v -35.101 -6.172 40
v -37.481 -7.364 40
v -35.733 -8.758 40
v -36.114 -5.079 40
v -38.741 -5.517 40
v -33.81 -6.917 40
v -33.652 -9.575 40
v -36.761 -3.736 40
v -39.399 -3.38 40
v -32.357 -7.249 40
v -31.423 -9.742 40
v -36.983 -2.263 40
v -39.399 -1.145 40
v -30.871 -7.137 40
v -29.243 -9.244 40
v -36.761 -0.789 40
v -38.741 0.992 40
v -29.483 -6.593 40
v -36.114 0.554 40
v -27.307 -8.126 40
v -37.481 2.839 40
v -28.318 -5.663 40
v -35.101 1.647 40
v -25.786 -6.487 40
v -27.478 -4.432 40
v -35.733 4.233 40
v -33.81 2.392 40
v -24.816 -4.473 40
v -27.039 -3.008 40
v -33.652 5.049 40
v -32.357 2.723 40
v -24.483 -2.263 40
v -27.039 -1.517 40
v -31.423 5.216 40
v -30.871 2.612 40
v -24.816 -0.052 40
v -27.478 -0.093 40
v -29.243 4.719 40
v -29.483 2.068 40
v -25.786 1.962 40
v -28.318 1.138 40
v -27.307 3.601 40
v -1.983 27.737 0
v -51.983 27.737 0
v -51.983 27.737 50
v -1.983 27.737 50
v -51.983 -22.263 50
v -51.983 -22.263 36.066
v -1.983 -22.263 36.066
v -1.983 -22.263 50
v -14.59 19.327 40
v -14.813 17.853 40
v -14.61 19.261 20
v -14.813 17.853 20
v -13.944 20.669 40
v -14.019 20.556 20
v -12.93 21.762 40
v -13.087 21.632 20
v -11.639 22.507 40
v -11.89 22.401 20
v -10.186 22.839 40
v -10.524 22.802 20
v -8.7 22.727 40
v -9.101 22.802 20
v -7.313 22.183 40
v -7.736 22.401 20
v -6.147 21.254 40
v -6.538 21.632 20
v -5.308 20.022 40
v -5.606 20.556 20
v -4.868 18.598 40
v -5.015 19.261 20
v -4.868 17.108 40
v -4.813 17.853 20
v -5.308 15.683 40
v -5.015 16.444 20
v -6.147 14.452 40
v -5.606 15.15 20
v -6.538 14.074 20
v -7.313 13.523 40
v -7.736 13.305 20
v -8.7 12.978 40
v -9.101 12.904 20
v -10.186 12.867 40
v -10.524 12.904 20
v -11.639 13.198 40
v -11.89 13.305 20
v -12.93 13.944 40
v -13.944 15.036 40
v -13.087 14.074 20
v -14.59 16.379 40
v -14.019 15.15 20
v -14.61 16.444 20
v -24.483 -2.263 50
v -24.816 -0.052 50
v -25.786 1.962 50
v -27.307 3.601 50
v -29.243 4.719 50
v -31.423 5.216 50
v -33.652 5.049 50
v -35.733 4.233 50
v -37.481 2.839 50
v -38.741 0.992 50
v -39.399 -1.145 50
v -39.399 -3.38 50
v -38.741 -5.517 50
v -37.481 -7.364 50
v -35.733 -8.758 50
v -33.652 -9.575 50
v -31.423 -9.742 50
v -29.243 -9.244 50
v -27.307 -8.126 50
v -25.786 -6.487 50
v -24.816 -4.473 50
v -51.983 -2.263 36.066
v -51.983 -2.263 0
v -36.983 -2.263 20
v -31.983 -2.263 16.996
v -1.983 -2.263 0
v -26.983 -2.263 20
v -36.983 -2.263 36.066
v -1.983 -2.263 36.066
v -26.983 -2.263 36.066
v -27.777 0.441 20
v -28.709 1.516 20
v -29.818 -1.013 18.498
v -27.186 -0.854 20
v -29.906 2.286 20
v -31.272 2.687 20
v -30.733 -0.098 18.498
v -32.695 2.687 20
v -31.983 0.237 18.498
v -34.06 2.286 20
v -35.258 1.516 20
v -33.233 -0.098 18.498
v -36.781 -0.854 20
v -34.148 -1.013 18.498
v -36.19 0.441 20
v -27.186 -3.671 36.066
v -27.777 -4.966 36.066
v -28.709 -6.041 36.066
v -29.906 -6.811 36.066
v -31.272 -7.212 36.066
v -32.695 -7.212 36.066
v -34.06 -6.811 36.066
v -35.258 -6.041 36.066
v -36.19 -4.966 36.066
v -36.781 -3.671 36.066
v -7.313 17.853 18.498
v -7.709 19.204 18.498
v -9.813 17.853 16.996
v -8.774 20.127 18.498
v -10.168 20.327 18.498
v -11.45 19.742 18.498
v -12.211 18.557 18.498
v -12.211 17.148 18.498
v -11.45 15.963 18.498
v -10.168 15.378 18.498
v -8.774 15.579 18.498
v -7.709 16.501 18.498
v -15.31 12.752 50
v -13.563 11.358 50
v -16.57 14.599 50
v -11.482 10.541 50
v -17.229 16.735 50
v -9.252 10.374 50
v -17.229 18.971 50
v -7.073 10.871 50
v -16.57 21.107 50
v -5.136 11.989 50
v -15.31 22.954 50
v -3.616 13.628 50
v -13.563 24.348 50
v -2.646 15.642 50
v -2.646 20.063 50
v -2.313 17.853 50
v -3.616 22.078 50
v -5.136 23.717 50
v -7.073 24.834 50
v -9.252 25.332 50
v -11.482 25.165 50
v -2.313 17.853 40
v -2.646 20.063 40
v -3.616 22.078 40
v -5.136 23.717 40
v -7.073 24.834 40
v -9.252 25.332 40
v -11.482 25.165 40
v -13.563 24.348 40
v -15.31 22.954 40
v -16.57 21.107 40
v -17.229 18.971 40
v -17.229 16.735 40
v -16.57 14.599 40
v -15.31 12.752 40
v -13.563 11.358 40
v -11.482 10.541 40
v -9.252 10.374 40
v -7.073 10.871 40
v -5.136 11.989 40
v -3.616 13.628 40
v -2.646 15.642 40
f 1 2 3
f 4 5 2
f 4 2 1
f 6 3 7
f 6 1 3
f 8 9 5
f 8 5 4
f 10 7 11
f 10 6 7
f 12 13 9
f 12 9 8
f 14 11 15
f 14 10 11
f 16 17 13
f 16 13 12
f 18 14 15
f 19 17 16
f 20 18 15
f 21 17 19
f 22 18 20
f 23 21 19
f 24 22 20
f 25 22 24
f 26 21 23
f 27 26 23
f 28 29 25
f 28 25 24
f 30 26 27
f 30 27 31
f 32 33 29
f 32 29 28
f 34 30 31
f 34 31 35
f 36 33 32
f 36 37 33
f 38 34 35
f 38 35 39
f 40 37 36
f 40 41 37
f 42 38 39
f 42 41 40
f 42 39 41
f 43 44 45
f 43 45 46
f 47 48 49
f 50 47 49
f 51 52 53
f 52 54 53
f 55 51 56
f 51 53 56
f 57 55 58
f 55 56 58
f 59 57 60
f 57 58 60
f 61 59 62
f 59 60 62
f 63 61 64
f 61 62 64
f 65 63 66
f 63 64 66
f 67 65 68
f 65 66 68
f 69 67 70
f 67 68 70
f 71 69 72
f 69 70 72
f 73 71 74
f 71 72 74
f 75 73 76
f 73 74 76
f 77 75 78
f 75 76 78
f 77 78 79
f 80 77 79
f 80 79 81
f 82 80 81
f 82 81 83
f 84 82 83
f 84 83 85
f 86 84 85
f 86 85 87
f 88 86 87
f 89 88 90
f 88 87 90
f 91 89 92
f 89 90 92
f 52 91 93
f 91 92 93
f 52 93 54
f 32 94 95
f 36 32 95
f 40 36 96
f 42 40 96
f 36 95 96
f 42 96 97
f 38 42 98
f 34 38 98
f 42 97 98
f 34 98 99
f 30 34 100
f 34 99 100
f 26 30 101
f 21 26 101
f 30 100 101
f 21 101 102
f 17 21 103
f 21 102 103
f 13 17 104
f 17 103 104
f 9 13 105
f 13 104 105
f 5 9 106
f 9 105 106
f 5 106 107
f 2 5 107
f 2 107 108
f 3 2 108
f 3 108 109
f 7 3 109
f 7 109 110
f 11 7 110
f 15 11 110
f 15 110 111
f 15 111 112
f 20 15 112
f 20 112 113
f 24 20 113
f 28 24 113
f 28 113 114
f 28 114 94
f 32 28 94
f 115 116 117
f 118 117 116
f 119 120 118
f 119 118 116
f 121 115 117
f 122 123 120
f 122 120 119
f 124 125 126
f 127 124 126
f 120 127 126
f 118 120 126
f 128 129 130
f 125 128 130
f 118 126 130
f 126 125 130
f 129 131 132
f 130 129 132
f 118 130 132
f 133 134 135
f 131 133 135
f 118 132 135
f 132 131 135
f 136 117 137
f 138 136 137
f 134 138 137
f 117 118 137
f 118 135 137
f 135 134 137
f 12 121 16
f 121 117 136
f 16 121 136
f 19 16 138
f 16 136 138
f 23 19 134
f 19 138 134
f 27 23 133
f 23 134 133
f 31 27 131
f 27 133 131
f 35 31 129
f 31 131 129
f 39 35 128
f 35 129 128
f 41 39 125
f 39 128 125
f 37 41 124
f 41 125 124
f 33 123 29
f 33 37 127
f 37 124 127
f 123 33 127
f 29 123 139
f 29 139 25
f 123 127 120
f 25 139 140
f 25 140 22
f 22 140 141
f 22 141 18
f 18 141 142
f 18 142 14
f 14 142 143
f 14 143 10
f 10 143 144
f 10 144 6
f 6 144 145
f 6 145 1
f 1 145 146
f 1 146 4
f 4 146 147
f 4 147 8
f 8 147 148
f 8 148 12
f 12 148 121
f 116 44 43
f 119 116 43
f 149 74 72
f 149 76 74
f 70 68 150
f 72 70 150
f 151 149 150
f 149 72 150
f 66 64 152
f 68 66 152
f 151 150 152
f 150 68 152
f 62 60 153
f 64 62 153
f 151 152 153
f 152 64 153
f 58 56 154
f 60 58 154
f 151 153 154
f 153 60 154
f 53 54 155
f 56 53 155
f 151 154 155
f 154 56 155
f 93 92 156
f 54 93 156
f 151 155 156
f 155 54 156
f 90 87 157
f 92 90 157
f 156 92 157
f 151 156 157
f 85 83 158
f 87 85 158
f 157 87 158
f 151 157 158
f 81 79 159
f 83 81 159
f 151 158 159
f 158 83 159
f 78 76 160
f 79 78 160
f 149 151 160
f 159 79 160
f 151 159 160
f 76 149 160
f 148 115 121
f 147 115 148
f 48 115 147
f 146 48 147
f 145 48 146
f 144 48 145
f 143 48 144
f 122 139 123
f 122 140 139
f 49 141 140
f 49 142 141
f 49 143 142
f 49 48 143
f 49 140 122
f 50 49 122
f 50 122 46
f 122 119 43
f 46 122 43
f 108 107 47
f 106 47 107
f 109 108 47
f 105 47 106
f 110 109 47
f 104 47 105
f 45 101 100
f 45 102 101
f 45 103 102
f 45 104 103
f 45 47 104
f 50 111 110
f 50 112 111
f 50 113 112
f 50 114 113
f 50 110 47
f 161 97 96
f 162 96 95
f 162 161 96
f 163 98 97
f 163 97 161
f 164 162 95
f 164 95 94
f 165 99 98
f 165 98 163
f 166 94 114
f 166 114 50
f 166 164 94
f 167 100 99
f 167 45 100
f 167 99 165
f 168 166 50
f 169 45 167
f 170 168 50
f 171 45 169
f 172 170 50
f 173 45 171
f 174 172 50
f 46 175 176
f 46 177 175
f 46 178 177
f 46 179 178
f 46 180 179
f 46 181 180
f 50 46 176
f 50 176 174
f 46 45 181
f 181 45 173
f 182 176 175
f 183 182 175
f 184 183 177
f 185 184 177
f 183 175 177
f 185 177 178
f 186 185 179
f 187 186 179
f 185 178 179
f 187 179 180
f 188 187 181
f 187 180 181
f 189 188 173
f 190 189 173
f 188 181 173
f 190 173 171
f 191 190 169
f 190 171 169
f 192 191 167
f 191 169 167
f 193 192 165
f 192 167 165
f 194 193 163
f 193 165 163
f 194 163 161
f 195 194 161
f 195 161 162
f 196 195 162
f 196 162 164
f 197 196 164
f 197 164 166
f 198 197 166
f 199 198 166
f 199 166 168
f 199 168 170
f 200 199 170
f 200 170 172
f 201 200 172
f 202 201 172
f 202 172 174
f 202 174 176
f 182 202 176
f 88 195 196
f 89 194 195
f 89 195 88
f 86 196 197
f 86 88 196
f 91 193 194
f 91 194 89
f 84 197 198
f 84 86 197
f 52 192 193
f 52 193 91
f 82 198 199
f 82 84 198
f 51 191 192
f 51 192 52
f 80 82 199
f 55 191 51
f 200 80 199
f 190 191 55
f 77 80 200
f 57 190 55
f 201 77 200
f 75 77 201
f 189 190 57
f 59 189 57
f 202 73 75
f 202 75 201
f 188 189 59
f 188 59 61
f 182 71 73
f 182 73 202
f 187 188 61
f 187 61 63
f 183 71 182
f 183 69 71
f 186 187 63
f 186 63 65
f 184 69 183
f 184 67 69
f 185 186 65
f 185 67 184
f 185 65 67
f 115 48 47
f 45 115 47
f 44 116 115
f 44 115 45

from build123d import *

# Parameters (mm, degrees)
F0_W           = 50
F0_H           = 50
F1_DEPTH       = 50
F3_D           = 10
F3_DEPTH       = 30
F3_CBORE_D     = 15
F3_CBORE_DEPTH = 10
F3_TIP         = 3.0043030951
F4_D           = 10
F4_DEPTH       = 30
F4_CBORE_D     = 15
F4_CBORE_DEPTH = 10
F4_TIP         = 3.0043030951
F5_W           = 62.9621855915
F5_H           = 46.8907589093
F6_DEPTH       = 20


with BuildPart() as f1:
    # F0 (on Top) → F1 (new body)
    with BuildSketch(Plane.XY):
        with Locations((-26.9832524723, 2.7374359779)):
            Rectangle(F0_W, F0_H)
    extrude(amount=F1_DEPTH)

    # F3
    with Locations(Plane.XY.offset(50)):
        with Locations((-31.9832524723, -2.2625640221)):
            CounterBoreHole(F3_D / 2, F3_CBORE_D / 2, F3_CBORE_DEPTH, depth=F3_DEPTH)
            with Locations((0, 0, -(F3_DEPTH + F3_TIP / 2))):  # 118° drill point
                Cone(0, F3_D / 2, F3_TIP, mode=Mode.SUBTRACT)

    # F4
    with Locations(Plane.XY.offset(50)):
        with Locations((-9.8126017437, 17.8528092922)):
            CounterBoreHole(F4_D / 2, F4_CBORE_D / 2, F4_CBORE_DEPTH, depth=F4_DEPTH)
            with Locations((0, 0, -(F4_DEPTH + F4_TIP / 2))):  # 118° drill point
                Cone(0, F4_D / 2, F4_TIP, mode=Mode.SUBTRACT)

    # F5 (on face) → F6 (cut)
    with BuildSketch(Plane.XZ.offset(22.2625640221)):
        with Locations((-22.54726924, 12.6207987778)):
            Rectangle(F5_W, F5_H)
    extrude(amount=-F6_DEPTH, mode=Mode.SUBTRACT)


solid = f1.part
